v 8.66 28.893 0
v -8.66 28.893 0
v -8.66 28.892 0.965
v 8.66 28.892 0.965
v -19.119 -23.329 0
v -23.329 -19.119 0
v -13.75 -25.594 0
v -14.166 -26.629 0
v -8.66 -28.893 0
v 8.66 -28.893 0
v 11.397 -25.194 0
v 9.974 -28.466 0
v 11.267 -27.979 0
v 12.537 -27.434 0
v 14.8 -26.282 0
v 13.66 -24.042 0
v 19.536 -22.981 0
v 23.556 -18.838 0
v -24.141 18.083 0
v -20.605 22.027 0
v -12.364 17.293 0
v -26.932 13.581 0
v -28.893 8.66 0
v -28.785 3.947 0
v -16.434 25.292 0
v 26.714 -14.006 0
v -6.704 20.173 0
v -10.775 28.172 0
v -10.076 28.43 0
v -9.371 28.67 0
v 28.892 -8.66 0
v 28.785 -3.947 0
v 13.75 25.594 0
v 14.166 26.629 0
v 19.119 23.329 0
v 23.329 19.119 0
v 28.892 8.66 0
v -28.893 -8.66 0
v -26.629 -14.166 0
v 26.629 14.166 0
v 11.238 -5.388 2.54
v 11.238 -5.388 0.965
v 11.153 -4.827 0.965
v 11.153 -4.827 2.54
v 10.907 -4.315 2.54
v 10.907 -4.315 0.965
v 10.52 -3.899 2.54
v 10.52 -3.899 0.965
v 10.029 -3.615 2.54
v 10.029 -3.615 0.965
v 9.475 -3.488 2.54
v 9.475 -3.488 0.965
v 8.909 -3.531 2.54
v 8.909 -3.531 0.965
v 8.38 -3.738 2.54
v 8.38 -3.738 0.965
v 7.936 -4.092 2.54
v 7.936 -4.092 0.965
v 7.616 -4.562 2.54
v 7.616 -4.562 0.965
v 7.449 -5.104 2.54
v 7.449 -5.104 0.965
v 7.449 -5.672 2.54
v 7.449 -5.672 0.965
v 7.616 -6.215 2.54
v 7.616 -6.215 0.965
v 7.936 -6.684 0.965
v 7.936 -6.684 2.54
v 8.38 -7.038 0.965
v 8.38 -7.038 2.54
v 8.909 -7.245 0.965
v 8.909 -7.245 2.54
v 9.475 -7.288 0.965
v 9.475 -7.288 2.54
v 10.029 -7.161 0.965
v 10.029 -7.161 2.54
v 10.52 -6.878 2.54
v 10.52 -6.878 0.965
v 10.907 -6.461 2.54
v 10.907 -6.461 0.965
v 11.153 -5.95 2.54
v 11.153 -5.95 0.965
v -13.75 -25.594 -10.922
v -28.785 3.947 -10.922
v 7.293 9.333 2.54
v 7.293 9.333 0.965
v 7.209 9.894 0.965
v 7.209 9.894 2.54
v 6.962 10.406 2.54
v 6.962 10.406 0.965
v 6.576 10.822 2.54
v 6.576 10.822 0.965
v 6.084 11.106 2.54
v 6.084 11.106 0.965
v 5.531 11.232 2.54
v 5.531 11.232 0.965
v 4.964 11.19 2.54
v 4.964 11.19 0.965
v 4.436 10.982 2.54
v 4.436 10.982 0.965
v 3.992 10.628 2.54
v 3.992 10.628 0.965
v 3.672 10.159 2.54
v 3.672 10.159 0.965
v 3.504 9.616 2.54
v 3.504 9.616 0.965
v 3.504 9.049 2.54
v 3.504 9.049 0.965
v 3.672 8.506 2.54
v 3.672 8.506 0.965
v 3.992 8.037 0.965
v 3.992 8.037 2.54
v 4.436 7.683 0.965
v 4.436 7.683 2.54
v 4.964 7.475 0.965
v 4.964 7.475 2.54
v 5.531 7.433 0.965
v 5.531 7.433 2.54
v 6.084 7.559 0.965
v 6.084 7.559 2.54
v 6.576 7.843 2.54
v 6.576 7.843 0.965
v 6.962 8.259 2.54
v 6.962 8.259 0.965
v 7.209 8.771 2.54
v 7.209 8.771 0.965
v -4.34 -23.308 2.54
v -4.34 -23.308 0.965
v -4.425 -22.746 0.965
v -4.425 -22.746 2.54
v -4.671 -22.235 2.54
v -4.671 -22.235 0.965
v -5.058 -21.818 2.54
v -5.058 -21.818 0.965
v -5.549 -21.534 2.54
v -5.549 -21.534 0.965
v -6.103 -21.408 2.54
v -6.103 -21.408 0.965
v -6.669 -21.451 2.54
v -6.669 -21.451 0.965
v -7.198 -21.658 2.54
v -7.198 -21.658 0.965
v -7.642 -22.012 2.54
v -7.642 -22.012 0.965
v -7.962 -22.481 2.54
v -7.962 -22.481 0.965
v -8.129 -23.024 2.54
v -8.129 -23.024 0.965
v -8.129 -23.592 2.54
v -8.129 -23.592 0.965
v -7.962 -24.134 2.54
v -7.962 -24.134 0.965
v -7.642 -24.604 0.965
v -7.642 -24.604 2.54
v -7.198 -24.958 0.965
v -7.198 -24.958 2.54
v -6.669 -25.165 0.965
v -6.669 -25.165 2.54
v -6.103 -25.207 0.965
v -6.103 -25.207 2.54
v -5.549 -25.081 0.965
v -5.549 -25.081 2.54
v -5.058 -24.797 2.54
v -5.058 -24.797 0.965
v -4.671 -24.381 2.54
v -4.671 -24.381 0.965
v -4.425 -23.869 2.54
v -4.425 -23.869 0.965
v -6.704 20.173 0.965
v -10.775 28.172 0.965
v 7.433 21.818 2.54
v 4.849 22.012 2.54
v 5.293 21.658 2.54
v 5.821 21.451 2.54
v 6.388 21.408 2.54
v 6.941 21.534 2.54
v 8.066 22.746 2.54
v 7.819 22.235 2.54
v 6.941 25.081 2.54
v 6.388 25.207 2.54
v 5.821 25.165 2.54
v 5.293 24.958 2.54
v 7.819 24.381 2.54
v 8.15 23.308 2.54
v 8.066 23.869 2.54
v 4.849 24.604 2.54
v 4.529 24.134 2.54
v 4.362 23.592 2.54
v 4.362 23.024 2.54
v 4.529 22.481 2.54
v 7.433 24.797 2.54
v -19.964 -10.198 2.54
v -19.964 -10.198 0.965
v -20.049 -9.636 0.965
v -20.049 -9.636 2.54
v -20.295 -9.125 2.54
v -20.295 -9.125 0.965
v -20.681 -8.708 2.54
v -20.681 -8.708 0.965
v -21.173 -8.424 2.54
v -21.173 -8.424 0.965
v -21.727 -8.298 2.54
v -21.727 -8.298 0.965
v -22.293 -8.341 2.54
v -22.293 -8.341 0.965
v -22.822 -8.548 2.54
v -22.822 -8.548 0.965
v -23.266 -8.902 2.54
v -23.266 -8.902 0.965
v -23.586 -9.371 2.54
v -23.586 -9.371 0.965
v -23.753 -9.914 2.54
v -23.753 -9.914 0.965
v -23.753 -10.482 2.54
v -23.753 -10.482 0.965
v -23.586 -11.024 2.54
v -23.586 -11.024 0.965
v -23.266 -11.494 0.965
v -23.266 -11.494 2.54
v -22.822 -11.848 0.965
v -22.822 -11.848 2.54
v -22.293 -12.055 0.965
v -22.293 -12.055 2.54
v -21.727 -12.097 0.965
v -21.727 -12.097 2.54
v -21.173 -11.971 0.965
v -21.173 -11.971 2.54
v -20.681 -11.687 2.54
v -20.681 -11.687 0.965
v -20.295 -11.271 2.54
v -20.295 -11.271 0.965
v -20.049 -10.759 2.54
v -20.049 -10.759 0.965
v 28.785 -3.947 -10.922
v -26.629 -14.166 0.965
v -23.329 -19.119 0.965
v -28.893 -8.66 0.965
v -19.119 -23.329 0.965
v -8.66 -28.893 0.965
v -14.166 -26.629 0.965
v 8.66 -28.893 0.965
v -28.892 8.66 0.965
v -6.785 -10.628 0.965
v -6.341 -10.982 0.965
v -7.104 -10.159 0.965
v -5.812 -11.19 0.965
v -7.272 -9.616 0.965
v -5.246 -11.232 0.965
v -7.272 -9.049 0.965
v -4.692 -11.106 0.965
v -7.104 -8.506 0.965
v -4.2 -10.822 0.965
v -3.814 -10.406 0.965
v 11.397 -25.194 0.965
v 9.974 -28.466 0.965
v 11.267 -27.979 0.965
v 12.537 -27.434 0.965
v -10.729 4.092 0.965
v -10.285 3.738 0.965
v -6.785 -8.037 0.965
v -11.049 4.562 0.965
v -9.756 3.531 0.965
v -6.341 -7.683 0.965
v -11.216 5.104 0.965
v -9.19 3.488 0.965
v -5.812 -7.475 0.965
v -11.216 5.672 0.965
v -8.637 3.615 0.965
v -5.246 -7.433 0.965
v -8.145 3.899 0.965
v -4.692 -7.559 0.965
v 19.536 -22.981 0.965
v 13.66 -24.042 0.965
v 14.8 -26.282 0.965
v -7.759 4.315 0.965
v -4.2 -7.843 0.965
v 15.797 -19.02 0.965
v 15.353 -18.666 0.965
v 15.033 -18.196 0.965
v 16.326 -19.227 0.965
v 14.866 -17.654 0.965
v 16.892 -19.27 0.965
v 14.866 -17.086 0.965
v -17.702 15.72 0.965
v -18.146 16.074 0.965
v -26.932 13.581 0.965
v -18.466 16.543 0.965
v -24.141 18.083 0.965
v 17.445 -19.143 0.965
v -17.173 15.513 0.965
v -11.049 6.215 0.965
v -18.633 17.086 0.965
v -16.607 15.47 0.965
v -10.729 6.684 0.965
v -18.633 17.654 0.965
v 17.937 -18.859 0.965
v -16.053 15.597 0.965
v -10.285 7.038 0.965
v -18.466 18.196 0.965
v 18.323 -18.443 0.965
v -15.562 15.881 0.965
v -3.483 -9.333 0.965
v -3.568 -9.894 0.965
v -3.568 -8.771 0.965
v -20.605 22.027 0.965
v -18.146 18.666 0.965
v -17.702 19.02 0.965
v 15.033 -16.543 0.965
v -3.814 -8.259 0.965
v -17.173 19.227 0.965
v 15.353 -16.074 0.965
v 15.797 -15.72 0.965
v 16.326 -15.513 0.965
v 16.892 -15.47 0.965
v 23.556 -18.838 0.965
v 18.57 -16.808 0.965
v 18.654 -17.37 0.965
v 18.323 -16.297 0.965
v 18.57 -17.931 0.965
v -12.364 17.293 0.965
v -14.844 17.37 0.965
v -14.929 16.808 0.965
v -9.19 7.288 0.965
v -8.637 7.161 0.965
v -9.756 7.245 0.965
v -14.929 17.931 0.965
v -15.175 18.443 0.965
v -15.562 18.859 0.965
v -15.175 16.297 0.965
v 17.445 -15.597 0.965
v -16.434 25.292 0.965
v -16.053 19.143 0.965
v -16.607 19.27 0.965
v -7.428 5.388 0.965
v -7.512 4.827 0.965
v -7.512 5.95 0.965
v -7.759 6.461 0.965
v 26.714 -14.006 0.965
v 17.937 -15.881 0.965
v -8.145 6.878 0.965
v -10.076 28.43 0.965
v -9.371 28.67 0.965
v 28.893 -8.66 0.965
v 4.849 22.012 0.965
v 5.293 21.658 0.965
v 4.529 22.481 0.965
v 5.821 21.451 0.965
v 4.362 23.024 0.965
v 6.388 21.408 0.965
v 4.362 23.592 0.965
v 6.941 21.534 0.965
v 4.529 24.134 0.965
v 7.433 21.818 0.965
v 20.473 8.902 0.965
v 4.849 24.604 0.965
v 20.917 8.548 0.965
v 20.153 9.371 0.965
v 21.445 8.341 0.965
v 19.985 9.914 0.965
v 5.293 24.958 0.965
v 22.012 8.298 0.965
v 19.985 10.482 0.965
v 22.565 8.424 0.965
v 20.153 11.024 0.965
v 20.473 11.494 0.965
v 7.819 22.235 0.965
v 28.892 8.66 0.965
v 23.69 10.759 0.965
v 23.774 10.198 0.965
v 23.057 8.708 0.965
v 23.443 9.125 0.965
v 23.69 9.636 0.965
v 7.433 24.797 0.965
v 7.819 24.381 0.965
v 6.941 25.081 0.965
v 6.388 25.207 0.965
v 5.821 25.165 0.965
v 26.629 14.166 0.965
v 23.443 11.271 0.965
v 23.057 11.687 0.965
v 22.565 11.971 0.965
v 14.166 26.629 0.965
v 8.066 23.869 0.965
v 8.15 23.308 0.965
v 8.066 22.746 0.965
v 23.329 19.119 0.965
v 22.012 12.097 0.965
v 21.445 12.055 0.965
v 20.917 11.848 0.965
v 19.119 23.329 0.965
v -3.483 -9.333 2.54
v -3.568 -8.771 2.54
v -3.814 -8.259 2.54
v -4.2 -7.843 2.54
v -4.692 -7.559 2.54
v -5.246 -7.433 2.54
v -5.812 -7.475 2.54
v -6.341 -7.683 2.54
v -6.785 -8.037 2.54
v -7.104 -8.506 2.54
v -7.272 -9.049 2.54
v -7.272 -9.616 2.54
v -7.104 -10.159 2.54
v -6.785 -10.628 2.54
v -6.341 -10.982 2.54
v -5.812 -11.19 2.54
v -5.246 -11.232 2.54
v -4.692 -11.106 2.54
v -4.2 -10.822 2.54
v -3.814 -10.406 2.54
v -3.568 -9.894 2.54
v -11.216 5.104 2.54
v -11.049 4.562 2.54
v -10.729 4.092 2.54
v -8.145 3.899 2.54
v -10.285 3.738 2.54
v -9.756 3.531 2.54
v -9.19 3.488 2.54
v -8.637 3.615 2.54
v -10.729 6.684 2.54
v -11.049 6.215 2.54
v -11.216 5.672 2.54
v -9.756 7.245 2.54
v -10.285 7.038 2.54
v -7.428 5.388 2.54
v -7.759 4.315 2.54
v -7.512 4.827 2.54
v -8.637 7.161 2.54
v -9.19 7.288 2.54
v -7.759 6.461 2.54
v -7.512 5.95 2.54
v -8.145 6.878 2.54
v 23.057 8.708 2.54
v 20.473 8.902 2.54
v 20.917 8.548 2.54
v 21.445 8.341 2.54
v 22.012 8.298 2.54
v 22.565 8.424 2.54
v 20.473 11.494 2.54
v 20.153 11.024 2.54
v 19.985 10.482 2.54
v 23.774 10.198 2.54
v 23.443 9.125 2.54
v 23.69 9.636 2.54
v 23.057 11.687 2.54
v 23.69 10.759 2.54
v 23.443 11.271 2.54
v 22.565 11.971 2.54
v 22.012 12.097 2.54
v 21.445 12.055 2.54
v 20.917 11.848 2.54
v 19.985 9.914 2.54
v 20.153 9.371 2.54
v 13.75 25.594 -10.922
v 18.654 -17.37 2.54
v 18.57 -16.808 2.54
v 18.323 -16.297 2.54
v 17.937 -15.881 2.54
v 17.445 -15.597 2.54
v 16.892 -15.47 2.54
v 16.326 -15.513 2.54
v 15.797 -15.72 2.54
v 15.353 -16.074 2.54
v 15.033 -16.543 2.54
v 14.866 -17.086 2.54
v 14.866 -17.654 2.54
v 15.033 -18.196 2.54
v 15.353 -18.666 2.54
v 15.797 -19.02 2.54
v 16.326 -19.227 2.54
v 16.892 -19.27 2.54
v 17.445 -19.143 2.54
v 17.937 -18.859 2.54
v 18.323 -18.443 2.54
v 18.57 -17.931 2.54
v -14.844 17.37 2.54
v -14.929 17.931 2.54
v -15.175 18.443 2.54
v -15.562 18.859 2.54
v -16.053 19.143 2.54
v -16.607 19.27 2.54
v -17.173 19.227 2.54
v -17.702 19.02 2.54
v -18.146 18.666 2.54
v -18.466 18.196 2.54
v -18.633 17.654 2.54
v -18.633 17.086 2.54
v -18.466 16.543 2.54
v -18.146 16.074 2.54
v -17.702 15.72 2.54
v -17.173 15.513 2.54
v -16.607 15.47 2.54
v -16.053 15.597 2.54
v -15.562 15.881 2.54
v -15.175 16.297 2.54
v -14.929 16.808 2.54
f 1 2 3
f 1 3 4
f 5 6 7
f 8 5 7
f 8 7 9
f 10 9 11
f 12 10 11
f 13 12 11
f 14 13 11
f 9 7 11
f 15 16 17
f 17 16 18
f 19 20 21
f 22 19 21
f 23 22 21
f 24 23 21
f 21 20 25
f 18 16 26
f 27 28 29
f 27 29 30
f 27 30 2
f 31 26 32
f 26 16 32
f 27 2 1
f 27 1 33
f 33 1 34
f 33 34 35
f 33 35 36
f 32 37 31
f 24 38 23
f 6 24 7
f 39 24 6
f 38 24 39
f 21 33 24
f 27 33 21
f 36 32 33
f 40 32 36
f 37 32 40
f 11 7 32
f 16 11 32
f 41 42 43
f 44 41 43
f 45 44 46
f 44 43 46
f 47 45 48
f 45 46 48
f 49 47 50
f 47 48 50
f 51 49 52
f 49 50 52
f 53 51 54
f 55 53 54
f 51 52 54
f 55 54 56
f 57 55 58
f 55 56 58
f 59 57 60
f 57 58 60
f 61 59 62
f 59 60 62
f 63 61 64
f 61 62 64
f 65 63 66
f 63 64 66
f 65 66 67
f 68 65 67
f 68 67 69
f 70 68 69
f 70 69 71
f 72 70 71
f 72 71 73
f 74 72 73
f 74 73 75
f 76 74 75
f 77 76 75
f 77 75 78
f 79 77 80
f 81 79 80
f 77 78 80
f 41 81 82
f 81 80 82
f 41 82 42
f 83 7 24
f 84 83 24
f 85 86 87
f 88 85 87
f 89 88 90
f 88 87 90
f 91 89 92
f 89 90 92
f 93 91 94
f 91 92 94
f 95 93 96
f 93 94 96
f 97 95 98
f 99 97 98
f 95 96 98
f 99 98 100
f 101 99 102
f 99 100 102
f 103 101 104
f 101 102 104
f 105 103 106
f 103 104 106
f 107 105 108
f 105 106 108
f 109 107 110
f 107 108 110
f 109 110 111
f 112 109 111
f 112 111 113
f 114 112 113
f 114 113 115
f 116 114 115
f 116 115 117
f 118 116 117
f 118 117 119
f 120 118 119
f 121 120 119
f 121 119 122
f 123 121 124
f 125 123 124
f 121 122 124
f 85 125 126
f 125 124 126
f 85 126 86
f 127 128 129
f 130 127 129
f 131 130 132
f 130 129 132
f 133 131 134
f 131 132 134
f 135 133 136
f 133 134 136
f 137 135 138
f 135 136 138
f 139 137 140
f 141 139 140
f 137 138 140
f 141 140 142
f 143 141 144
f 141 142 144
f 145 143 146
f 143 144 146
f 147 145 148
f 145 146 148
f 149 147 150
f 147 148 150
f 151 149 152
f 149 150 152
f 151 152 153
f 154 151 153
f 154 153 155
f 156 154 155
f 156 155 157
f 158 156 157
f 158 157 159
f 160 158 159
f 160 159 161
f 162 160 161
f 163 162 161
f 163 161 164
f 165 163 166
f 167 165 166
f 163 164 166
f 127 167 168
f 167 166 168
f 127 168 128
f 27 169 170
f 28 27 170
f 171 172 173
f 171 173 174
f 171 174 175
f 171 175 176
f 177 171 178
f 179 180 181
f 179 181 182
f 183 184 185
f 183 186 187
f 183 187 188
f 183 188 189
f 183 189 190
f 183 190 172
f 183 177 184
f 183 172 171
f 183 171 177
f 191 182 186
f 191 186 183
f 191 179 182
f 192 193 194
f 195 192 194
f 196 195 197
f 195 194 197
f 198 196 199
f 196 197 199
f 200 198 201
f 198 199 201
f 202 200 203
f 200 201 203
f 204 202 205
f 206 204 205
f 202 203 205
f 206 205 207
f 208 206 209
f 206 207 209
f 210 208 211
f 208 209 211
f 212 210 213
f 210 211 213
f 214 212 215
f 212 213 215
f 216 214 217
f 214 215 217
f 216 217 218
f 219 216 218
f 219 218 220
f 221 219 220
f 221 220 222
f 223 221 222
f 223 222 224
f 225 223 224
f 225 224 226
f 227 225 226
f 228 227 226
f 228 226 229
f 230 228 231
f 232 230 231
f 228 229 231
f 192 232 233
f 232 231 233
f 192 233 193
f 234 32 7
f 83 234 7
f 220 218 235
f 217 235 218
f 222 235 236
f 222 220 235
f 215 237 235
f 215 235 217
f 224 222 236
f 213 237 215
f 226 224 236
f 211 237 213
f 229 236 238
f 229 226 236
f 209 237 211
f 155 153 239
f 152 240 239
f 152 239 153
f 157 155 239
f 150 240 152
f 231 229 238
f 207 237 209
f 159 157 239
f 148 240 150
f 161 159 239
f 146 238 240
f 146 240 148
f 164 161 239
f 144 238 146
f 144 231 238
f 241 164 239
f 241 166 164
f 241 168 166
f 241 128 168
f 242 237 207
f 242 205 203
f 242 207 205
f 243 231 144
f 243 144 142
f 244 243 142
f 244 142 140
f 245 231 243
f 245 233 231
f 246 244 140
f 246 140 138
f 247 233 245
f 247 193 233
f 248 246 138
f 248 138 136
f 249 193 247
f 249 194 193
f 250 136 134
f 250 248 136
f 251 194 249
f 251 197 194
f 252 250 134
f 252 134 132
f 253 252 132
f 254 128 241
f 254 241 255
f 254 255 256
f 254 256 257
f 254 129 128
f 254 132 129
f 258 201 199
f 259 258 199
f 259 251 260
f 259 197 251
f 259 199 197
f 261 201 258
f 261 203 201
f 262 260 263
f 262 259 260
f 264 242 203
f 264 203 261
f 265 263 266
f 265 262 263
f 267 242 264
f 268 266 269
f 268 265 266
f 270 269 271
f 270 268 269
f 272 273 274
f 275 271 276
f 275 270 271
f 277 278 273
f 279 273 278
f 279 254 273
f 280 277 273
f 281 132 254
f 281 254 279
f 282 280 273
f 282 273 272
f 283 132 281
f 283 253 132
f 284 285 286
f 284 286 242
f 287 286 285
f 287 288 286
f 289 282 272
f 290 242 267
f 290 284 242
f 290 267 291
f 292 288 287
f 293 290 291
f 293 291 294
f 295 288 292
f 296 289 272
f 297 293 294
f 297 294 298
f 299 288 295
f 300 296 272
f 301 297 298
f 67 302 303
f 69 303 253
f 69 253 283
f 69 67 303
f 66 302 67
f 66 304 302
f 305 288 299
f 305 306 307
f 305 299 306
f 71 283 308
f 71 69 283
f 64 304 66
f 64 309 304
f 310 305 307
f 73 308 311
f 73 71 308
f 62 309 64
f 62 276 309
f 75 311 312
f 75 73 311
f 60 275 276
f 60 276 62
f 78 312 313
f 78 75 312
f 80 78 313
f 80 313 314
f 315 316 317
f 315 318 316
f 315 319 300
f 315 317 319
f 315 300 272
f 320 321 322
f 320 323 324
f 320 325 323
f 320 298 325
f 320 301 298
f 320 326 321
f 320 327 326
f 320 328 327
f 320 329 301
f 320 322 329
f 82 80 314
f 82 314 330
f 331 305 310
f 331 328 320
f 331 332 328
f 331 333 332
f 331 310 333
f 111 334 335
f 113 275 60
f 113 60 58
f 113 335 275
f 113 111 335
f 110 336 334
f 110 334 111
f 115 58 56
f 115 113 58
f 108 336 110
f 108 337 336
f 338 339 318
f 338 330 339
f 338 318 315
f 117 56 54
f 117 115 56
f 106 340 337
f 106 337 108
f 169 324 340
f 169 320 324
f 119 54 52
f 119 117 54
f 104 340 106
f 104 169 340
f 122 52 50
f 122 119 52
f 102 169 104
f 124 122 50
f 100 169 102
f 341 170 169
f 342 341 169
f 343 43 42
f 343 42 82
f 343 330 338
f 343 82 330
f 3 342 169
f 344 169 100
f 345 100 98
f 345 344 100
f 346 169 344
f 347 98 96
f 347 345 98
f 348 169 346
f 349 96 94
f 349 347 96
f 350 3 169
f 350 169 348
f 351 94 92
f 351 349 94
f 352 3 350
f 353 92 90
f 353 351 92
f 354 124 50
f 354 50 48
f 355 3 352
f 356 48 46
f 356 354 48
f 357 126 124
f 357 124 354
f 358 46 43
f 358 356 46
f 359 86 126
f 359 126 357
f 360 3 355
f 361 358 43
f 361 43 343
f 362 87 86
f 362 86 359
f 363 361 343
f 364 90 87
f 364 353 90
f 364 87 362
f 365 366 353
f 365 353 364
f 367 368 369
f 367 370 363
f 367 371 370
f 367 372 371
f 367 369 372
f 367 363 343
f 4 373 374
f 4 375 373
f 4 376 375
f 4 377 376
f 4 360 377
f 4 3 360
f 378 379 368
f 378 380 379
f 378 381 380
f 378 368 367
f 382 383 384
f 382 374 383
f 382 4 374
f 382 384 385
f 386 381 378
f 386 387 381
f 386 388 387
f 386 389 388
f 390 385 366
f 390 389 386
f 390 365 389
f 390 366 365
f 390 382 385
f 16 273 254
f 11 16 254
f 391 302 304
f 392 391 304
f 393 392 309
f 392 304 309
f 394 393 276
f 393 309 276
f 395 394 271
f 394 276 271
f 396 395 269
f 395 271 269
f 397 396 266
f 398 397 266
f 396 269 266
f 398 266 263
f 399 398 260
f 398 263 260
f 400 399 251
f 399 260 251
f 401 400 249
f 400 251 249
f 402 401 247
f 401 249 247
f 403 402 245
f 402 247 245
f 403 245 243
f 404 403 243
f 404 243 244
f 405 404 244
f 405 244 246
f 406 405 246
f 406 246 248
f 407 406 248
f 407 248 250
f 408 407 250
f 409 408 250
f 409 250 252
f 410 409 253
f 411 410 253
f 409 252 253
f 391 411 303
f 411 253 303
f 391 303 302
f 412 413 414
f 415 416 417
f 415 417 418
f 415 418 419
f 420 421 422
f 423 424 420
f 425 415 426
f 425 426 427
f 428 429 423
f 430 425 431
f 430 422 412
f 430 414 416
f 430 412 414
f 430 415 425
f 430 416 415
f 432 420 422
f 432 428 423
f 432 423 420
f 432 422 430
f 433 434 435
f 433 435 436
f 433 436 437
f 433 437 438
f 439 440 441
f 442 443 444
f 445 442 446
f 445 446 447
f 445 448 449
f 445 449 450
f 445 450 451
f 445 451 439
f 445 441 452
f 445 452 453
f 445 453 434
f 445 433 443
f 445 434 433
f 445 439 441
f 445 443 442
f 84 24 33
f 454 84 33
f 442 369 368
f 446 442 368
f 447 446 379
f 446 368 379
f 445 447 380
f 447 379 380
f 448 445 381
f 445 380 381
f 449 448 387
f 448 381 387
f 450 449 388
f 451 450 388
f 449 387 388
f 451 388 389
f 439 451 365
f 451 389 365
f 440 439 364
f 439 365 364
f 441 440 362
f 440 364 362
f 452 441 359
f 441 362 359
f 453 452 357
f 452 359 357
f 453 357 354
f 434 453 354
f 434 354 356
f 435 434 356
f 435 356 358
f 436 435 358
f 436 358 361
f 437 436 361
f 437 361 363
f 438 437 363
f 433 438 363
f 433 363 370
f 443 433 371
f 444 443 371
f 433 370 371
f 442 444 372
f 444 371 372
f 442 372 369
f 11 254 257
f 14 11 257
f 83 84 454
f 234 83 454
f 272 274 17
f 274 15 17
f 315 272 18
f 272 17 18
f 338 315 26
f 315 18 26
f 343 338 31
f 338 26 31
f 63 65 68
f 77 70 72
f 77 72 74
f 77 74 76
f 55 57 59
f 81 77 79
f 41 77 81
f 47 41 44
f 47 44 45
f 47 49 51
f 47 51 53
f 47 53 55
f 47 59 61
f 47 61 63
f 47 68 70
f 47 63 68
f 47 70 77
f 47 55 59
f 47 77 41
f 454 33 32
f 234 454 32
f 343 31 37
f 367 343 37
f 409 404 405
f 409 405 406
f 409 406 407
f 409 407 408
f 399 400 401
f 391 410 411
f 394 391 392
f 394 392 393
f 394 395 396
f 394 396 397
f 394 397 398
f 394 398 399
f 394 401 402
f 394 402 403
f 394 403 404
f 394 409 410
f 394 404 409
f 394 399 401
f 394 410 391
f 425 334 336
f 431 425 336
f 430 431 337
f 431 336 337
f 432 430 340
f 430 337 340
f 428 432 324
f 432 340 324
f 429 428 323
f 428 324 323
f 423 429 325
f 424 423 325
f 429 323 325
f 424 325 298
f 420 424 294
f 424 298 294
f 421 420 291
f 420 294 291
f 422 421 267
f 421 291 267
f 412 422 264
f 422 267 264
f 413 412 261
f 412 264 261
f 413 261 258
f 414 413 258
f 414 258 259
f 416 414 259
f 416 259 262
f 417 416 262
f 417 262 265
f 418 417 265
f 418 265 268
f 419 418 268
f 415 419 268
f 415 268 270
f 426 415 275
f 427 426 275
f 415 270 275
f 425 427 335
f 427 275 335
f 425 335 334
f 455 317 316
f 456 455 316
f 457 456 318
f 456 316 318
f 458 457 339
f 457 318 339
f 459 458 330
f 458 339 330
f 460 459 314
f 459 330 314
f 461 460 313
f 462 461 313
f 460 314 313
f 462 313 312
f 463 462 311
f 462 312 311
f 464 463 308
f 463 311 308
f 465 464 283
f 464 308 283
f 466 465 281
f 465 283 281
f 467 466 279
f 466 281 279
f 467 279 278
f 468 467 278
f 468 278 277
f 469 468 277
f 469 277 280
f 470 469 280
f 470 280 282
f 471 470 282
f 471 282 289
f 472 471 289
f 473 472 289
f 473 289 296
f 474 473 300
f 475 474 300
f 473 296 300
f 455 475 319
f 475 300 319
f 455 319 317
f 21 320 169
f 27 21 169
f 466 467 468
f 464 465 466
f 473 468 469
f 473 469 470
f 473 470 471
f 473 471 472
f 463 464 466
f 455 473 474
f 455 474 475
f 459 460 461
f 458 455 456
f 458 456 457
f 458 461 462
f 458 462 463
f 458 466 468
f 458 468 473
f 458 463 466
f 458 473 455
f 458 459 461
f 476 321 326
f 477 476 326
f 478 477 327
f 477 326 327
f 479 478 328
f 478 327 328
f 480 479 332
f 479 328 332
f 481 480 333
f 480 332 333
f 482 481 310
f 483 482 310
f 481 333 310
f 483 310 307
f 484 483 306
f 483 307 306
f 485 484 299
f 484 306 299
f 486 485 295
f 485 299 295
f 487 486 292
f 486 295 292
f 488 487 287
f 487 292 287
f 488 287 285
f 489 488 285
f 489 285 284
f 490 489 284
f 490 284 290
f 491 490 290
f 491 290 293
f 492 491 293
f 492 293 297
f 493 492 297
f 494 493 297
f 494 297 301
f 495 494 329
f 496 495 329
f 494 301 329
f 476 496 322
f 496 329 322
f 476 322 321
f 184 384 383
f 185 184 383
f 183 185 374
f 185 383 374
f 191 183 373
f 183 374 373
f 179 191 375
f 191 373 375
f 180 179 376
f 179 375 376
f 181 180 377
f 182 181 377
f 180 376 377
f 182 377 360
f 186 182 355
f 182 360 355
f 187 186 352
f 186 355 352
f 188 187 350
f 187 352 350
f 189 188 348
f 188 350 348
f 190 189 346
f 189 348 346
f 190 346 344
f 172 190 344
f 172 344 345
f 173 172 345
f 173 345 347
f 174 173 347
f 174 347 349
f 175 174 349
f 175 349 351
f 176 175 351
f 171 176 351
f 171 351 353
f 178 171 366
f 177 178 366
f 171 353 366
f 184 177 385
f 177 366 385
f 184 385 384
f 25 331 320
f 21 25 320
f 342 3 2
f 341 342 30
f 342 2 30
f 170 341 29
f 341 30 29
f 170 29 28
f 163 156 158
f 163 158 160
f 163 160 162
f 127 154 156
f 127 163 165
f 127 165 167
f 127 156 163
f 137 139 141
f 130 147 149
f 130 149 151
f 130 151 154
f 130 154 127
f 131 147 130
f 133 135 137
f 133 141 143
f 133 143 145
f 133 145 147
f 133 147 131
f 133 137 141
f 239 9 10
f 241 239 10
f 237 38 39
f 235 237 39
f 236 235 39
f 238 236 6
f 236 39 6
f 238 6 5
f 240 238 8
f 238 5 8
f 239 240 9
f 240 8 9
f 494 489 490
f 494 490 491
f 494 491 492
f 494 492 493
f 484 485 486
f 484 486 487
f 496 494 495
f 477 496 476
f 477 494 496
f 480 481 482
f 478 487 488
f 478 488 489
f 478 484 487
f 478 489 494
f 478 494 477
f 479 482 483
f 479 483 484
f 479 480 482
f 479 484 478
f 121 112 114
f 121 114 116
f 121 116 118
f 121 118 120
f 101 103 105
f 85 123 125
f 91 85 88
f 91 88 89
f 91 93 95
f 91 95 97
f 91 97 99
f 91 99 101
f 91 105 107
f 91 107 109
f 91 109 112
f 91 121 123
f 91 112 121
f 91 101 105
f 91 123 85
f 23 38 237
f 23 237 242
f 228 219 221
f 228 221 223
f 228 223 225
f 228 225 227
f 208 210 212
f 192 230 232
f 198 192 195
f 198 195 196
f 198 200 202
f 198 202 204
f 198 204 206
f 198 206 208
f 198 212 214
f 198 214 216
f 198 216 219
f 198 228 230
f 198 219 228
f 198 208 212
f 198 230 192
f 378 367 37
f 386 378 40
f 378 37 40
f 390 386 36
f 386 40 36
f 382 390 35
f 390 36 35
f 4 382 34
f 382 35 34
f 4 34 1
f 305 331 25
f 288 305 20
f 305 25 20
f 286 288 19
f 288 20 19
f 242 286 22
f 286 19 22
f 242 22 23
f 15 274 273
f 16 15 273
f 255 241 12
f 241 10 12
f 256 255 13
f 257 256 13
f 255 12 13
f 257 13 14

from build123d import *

# Parameters (mm, degrees)
F0_R      = 30.1625
F1_DEPTH  = 0.9652
F2_W      = 76.2
F2_H      = 76.2
F2_W_2    = 57.785
F2_H_2    = 57.785
F3_DEPTH  = 0.9662
F4_R      = 1.905
F5_DEPTH  = 1.5748
F6_R      = 1.905
F7_DEPTH  = 1.5748
F9_DEPTH  = 25.4
F11_DEPTH = 25.4
F13_DEPTH = 10.922


with BuildPart() as f1:
    # F0 (on Top) → F1 (new body)
    with BuildSketch(Plane.XY):
        Circle(F0_R)
    extrude(amount=F1_DEPTH)

    # F2 (on Top) → F3 (cut, through all)
    with BuildSketch(Plane.XY):
        Rectangle(F2_W, F2_H)
        Rectangle(F2_W_2, F2_H_2, mode=Mode.SUBTRACT)
    extrude(amount=F3_DEPTH, mode=Mode.SUBTRACT)

    # F4 (on face) → F5 (join)
    with BuildSketch(Plane.XY.offset(0.9652)):
        with Locations((-9.332556, 5.388154)):
            Circle(F4_R)
        with Locations((5.388154, 9.332556)):
            Circle(F4_R)
        with Locations((9.332556, -5.388154)):
            Circle(F4_R)
        with Locations((-5.388154, -9.332556)):
            Circle(F4_R)
    extrude(amount=F5_DEPTH)

    # F6 (on face) → F7 (join)
    with BuildSketch(Plane.XY.offset(0.9652)):
        with Locations((6.245304, 23.30779)):
            Circle(F6_R)
        with Locations((-16.749408, 17.369924)):
            Circle(F6_R)
        with Locations((-6.245304, -23.30779)):
            Circle(F6_R)
        with Locations((16.749408, -17.369924)):
            Circle(F6_R)
        with Locations((21.869207, 10.197779)):
            Circle(F6_R)
        with Locations((-21.869207, -10.197779)):
            Circle(F6_R)
    extrude(amount=F7_DEPTH)

    # F8 (on face) → F9 (cut)
    with BuildSketch(Plane.XY.offset(0.9652)):
        Polygon((11.396703, -25.19386), (12.548755, -27.457568), (14.812463, -26.305517), (13.660412, -24.041808), align=None)
    extrude(amount=-F9_DEPTH, mode=Mode.SUBTRACT)

    # F10 (on face) → F11 (cut)
    with BuildSketch(Plane.XY.offset(0.9652)):
        Polygon((-10.851198, 28.321521), (-16.510447, 25.441348), (-12.363614, 17.29324), (-6.704365, 20.173413), align=None)
    extrude(amount=-F11_DEPTH, mode=Mode.SUBTRACT)

    # F12 (on face) → F13 (join)
    with BuildSketch(Plane(origin=(0, 0, 0), x_dir=(1, 0, 0), z_dir=(0, 0, -1))):
        Polygon((-28.784711, -3.94695), (13.750207, -25.594331), (28.784711, 3.94695), (-13.750207, 25.594331), align=None)
    extrude(amount=F13_DEPTH)


solid = f1.part
